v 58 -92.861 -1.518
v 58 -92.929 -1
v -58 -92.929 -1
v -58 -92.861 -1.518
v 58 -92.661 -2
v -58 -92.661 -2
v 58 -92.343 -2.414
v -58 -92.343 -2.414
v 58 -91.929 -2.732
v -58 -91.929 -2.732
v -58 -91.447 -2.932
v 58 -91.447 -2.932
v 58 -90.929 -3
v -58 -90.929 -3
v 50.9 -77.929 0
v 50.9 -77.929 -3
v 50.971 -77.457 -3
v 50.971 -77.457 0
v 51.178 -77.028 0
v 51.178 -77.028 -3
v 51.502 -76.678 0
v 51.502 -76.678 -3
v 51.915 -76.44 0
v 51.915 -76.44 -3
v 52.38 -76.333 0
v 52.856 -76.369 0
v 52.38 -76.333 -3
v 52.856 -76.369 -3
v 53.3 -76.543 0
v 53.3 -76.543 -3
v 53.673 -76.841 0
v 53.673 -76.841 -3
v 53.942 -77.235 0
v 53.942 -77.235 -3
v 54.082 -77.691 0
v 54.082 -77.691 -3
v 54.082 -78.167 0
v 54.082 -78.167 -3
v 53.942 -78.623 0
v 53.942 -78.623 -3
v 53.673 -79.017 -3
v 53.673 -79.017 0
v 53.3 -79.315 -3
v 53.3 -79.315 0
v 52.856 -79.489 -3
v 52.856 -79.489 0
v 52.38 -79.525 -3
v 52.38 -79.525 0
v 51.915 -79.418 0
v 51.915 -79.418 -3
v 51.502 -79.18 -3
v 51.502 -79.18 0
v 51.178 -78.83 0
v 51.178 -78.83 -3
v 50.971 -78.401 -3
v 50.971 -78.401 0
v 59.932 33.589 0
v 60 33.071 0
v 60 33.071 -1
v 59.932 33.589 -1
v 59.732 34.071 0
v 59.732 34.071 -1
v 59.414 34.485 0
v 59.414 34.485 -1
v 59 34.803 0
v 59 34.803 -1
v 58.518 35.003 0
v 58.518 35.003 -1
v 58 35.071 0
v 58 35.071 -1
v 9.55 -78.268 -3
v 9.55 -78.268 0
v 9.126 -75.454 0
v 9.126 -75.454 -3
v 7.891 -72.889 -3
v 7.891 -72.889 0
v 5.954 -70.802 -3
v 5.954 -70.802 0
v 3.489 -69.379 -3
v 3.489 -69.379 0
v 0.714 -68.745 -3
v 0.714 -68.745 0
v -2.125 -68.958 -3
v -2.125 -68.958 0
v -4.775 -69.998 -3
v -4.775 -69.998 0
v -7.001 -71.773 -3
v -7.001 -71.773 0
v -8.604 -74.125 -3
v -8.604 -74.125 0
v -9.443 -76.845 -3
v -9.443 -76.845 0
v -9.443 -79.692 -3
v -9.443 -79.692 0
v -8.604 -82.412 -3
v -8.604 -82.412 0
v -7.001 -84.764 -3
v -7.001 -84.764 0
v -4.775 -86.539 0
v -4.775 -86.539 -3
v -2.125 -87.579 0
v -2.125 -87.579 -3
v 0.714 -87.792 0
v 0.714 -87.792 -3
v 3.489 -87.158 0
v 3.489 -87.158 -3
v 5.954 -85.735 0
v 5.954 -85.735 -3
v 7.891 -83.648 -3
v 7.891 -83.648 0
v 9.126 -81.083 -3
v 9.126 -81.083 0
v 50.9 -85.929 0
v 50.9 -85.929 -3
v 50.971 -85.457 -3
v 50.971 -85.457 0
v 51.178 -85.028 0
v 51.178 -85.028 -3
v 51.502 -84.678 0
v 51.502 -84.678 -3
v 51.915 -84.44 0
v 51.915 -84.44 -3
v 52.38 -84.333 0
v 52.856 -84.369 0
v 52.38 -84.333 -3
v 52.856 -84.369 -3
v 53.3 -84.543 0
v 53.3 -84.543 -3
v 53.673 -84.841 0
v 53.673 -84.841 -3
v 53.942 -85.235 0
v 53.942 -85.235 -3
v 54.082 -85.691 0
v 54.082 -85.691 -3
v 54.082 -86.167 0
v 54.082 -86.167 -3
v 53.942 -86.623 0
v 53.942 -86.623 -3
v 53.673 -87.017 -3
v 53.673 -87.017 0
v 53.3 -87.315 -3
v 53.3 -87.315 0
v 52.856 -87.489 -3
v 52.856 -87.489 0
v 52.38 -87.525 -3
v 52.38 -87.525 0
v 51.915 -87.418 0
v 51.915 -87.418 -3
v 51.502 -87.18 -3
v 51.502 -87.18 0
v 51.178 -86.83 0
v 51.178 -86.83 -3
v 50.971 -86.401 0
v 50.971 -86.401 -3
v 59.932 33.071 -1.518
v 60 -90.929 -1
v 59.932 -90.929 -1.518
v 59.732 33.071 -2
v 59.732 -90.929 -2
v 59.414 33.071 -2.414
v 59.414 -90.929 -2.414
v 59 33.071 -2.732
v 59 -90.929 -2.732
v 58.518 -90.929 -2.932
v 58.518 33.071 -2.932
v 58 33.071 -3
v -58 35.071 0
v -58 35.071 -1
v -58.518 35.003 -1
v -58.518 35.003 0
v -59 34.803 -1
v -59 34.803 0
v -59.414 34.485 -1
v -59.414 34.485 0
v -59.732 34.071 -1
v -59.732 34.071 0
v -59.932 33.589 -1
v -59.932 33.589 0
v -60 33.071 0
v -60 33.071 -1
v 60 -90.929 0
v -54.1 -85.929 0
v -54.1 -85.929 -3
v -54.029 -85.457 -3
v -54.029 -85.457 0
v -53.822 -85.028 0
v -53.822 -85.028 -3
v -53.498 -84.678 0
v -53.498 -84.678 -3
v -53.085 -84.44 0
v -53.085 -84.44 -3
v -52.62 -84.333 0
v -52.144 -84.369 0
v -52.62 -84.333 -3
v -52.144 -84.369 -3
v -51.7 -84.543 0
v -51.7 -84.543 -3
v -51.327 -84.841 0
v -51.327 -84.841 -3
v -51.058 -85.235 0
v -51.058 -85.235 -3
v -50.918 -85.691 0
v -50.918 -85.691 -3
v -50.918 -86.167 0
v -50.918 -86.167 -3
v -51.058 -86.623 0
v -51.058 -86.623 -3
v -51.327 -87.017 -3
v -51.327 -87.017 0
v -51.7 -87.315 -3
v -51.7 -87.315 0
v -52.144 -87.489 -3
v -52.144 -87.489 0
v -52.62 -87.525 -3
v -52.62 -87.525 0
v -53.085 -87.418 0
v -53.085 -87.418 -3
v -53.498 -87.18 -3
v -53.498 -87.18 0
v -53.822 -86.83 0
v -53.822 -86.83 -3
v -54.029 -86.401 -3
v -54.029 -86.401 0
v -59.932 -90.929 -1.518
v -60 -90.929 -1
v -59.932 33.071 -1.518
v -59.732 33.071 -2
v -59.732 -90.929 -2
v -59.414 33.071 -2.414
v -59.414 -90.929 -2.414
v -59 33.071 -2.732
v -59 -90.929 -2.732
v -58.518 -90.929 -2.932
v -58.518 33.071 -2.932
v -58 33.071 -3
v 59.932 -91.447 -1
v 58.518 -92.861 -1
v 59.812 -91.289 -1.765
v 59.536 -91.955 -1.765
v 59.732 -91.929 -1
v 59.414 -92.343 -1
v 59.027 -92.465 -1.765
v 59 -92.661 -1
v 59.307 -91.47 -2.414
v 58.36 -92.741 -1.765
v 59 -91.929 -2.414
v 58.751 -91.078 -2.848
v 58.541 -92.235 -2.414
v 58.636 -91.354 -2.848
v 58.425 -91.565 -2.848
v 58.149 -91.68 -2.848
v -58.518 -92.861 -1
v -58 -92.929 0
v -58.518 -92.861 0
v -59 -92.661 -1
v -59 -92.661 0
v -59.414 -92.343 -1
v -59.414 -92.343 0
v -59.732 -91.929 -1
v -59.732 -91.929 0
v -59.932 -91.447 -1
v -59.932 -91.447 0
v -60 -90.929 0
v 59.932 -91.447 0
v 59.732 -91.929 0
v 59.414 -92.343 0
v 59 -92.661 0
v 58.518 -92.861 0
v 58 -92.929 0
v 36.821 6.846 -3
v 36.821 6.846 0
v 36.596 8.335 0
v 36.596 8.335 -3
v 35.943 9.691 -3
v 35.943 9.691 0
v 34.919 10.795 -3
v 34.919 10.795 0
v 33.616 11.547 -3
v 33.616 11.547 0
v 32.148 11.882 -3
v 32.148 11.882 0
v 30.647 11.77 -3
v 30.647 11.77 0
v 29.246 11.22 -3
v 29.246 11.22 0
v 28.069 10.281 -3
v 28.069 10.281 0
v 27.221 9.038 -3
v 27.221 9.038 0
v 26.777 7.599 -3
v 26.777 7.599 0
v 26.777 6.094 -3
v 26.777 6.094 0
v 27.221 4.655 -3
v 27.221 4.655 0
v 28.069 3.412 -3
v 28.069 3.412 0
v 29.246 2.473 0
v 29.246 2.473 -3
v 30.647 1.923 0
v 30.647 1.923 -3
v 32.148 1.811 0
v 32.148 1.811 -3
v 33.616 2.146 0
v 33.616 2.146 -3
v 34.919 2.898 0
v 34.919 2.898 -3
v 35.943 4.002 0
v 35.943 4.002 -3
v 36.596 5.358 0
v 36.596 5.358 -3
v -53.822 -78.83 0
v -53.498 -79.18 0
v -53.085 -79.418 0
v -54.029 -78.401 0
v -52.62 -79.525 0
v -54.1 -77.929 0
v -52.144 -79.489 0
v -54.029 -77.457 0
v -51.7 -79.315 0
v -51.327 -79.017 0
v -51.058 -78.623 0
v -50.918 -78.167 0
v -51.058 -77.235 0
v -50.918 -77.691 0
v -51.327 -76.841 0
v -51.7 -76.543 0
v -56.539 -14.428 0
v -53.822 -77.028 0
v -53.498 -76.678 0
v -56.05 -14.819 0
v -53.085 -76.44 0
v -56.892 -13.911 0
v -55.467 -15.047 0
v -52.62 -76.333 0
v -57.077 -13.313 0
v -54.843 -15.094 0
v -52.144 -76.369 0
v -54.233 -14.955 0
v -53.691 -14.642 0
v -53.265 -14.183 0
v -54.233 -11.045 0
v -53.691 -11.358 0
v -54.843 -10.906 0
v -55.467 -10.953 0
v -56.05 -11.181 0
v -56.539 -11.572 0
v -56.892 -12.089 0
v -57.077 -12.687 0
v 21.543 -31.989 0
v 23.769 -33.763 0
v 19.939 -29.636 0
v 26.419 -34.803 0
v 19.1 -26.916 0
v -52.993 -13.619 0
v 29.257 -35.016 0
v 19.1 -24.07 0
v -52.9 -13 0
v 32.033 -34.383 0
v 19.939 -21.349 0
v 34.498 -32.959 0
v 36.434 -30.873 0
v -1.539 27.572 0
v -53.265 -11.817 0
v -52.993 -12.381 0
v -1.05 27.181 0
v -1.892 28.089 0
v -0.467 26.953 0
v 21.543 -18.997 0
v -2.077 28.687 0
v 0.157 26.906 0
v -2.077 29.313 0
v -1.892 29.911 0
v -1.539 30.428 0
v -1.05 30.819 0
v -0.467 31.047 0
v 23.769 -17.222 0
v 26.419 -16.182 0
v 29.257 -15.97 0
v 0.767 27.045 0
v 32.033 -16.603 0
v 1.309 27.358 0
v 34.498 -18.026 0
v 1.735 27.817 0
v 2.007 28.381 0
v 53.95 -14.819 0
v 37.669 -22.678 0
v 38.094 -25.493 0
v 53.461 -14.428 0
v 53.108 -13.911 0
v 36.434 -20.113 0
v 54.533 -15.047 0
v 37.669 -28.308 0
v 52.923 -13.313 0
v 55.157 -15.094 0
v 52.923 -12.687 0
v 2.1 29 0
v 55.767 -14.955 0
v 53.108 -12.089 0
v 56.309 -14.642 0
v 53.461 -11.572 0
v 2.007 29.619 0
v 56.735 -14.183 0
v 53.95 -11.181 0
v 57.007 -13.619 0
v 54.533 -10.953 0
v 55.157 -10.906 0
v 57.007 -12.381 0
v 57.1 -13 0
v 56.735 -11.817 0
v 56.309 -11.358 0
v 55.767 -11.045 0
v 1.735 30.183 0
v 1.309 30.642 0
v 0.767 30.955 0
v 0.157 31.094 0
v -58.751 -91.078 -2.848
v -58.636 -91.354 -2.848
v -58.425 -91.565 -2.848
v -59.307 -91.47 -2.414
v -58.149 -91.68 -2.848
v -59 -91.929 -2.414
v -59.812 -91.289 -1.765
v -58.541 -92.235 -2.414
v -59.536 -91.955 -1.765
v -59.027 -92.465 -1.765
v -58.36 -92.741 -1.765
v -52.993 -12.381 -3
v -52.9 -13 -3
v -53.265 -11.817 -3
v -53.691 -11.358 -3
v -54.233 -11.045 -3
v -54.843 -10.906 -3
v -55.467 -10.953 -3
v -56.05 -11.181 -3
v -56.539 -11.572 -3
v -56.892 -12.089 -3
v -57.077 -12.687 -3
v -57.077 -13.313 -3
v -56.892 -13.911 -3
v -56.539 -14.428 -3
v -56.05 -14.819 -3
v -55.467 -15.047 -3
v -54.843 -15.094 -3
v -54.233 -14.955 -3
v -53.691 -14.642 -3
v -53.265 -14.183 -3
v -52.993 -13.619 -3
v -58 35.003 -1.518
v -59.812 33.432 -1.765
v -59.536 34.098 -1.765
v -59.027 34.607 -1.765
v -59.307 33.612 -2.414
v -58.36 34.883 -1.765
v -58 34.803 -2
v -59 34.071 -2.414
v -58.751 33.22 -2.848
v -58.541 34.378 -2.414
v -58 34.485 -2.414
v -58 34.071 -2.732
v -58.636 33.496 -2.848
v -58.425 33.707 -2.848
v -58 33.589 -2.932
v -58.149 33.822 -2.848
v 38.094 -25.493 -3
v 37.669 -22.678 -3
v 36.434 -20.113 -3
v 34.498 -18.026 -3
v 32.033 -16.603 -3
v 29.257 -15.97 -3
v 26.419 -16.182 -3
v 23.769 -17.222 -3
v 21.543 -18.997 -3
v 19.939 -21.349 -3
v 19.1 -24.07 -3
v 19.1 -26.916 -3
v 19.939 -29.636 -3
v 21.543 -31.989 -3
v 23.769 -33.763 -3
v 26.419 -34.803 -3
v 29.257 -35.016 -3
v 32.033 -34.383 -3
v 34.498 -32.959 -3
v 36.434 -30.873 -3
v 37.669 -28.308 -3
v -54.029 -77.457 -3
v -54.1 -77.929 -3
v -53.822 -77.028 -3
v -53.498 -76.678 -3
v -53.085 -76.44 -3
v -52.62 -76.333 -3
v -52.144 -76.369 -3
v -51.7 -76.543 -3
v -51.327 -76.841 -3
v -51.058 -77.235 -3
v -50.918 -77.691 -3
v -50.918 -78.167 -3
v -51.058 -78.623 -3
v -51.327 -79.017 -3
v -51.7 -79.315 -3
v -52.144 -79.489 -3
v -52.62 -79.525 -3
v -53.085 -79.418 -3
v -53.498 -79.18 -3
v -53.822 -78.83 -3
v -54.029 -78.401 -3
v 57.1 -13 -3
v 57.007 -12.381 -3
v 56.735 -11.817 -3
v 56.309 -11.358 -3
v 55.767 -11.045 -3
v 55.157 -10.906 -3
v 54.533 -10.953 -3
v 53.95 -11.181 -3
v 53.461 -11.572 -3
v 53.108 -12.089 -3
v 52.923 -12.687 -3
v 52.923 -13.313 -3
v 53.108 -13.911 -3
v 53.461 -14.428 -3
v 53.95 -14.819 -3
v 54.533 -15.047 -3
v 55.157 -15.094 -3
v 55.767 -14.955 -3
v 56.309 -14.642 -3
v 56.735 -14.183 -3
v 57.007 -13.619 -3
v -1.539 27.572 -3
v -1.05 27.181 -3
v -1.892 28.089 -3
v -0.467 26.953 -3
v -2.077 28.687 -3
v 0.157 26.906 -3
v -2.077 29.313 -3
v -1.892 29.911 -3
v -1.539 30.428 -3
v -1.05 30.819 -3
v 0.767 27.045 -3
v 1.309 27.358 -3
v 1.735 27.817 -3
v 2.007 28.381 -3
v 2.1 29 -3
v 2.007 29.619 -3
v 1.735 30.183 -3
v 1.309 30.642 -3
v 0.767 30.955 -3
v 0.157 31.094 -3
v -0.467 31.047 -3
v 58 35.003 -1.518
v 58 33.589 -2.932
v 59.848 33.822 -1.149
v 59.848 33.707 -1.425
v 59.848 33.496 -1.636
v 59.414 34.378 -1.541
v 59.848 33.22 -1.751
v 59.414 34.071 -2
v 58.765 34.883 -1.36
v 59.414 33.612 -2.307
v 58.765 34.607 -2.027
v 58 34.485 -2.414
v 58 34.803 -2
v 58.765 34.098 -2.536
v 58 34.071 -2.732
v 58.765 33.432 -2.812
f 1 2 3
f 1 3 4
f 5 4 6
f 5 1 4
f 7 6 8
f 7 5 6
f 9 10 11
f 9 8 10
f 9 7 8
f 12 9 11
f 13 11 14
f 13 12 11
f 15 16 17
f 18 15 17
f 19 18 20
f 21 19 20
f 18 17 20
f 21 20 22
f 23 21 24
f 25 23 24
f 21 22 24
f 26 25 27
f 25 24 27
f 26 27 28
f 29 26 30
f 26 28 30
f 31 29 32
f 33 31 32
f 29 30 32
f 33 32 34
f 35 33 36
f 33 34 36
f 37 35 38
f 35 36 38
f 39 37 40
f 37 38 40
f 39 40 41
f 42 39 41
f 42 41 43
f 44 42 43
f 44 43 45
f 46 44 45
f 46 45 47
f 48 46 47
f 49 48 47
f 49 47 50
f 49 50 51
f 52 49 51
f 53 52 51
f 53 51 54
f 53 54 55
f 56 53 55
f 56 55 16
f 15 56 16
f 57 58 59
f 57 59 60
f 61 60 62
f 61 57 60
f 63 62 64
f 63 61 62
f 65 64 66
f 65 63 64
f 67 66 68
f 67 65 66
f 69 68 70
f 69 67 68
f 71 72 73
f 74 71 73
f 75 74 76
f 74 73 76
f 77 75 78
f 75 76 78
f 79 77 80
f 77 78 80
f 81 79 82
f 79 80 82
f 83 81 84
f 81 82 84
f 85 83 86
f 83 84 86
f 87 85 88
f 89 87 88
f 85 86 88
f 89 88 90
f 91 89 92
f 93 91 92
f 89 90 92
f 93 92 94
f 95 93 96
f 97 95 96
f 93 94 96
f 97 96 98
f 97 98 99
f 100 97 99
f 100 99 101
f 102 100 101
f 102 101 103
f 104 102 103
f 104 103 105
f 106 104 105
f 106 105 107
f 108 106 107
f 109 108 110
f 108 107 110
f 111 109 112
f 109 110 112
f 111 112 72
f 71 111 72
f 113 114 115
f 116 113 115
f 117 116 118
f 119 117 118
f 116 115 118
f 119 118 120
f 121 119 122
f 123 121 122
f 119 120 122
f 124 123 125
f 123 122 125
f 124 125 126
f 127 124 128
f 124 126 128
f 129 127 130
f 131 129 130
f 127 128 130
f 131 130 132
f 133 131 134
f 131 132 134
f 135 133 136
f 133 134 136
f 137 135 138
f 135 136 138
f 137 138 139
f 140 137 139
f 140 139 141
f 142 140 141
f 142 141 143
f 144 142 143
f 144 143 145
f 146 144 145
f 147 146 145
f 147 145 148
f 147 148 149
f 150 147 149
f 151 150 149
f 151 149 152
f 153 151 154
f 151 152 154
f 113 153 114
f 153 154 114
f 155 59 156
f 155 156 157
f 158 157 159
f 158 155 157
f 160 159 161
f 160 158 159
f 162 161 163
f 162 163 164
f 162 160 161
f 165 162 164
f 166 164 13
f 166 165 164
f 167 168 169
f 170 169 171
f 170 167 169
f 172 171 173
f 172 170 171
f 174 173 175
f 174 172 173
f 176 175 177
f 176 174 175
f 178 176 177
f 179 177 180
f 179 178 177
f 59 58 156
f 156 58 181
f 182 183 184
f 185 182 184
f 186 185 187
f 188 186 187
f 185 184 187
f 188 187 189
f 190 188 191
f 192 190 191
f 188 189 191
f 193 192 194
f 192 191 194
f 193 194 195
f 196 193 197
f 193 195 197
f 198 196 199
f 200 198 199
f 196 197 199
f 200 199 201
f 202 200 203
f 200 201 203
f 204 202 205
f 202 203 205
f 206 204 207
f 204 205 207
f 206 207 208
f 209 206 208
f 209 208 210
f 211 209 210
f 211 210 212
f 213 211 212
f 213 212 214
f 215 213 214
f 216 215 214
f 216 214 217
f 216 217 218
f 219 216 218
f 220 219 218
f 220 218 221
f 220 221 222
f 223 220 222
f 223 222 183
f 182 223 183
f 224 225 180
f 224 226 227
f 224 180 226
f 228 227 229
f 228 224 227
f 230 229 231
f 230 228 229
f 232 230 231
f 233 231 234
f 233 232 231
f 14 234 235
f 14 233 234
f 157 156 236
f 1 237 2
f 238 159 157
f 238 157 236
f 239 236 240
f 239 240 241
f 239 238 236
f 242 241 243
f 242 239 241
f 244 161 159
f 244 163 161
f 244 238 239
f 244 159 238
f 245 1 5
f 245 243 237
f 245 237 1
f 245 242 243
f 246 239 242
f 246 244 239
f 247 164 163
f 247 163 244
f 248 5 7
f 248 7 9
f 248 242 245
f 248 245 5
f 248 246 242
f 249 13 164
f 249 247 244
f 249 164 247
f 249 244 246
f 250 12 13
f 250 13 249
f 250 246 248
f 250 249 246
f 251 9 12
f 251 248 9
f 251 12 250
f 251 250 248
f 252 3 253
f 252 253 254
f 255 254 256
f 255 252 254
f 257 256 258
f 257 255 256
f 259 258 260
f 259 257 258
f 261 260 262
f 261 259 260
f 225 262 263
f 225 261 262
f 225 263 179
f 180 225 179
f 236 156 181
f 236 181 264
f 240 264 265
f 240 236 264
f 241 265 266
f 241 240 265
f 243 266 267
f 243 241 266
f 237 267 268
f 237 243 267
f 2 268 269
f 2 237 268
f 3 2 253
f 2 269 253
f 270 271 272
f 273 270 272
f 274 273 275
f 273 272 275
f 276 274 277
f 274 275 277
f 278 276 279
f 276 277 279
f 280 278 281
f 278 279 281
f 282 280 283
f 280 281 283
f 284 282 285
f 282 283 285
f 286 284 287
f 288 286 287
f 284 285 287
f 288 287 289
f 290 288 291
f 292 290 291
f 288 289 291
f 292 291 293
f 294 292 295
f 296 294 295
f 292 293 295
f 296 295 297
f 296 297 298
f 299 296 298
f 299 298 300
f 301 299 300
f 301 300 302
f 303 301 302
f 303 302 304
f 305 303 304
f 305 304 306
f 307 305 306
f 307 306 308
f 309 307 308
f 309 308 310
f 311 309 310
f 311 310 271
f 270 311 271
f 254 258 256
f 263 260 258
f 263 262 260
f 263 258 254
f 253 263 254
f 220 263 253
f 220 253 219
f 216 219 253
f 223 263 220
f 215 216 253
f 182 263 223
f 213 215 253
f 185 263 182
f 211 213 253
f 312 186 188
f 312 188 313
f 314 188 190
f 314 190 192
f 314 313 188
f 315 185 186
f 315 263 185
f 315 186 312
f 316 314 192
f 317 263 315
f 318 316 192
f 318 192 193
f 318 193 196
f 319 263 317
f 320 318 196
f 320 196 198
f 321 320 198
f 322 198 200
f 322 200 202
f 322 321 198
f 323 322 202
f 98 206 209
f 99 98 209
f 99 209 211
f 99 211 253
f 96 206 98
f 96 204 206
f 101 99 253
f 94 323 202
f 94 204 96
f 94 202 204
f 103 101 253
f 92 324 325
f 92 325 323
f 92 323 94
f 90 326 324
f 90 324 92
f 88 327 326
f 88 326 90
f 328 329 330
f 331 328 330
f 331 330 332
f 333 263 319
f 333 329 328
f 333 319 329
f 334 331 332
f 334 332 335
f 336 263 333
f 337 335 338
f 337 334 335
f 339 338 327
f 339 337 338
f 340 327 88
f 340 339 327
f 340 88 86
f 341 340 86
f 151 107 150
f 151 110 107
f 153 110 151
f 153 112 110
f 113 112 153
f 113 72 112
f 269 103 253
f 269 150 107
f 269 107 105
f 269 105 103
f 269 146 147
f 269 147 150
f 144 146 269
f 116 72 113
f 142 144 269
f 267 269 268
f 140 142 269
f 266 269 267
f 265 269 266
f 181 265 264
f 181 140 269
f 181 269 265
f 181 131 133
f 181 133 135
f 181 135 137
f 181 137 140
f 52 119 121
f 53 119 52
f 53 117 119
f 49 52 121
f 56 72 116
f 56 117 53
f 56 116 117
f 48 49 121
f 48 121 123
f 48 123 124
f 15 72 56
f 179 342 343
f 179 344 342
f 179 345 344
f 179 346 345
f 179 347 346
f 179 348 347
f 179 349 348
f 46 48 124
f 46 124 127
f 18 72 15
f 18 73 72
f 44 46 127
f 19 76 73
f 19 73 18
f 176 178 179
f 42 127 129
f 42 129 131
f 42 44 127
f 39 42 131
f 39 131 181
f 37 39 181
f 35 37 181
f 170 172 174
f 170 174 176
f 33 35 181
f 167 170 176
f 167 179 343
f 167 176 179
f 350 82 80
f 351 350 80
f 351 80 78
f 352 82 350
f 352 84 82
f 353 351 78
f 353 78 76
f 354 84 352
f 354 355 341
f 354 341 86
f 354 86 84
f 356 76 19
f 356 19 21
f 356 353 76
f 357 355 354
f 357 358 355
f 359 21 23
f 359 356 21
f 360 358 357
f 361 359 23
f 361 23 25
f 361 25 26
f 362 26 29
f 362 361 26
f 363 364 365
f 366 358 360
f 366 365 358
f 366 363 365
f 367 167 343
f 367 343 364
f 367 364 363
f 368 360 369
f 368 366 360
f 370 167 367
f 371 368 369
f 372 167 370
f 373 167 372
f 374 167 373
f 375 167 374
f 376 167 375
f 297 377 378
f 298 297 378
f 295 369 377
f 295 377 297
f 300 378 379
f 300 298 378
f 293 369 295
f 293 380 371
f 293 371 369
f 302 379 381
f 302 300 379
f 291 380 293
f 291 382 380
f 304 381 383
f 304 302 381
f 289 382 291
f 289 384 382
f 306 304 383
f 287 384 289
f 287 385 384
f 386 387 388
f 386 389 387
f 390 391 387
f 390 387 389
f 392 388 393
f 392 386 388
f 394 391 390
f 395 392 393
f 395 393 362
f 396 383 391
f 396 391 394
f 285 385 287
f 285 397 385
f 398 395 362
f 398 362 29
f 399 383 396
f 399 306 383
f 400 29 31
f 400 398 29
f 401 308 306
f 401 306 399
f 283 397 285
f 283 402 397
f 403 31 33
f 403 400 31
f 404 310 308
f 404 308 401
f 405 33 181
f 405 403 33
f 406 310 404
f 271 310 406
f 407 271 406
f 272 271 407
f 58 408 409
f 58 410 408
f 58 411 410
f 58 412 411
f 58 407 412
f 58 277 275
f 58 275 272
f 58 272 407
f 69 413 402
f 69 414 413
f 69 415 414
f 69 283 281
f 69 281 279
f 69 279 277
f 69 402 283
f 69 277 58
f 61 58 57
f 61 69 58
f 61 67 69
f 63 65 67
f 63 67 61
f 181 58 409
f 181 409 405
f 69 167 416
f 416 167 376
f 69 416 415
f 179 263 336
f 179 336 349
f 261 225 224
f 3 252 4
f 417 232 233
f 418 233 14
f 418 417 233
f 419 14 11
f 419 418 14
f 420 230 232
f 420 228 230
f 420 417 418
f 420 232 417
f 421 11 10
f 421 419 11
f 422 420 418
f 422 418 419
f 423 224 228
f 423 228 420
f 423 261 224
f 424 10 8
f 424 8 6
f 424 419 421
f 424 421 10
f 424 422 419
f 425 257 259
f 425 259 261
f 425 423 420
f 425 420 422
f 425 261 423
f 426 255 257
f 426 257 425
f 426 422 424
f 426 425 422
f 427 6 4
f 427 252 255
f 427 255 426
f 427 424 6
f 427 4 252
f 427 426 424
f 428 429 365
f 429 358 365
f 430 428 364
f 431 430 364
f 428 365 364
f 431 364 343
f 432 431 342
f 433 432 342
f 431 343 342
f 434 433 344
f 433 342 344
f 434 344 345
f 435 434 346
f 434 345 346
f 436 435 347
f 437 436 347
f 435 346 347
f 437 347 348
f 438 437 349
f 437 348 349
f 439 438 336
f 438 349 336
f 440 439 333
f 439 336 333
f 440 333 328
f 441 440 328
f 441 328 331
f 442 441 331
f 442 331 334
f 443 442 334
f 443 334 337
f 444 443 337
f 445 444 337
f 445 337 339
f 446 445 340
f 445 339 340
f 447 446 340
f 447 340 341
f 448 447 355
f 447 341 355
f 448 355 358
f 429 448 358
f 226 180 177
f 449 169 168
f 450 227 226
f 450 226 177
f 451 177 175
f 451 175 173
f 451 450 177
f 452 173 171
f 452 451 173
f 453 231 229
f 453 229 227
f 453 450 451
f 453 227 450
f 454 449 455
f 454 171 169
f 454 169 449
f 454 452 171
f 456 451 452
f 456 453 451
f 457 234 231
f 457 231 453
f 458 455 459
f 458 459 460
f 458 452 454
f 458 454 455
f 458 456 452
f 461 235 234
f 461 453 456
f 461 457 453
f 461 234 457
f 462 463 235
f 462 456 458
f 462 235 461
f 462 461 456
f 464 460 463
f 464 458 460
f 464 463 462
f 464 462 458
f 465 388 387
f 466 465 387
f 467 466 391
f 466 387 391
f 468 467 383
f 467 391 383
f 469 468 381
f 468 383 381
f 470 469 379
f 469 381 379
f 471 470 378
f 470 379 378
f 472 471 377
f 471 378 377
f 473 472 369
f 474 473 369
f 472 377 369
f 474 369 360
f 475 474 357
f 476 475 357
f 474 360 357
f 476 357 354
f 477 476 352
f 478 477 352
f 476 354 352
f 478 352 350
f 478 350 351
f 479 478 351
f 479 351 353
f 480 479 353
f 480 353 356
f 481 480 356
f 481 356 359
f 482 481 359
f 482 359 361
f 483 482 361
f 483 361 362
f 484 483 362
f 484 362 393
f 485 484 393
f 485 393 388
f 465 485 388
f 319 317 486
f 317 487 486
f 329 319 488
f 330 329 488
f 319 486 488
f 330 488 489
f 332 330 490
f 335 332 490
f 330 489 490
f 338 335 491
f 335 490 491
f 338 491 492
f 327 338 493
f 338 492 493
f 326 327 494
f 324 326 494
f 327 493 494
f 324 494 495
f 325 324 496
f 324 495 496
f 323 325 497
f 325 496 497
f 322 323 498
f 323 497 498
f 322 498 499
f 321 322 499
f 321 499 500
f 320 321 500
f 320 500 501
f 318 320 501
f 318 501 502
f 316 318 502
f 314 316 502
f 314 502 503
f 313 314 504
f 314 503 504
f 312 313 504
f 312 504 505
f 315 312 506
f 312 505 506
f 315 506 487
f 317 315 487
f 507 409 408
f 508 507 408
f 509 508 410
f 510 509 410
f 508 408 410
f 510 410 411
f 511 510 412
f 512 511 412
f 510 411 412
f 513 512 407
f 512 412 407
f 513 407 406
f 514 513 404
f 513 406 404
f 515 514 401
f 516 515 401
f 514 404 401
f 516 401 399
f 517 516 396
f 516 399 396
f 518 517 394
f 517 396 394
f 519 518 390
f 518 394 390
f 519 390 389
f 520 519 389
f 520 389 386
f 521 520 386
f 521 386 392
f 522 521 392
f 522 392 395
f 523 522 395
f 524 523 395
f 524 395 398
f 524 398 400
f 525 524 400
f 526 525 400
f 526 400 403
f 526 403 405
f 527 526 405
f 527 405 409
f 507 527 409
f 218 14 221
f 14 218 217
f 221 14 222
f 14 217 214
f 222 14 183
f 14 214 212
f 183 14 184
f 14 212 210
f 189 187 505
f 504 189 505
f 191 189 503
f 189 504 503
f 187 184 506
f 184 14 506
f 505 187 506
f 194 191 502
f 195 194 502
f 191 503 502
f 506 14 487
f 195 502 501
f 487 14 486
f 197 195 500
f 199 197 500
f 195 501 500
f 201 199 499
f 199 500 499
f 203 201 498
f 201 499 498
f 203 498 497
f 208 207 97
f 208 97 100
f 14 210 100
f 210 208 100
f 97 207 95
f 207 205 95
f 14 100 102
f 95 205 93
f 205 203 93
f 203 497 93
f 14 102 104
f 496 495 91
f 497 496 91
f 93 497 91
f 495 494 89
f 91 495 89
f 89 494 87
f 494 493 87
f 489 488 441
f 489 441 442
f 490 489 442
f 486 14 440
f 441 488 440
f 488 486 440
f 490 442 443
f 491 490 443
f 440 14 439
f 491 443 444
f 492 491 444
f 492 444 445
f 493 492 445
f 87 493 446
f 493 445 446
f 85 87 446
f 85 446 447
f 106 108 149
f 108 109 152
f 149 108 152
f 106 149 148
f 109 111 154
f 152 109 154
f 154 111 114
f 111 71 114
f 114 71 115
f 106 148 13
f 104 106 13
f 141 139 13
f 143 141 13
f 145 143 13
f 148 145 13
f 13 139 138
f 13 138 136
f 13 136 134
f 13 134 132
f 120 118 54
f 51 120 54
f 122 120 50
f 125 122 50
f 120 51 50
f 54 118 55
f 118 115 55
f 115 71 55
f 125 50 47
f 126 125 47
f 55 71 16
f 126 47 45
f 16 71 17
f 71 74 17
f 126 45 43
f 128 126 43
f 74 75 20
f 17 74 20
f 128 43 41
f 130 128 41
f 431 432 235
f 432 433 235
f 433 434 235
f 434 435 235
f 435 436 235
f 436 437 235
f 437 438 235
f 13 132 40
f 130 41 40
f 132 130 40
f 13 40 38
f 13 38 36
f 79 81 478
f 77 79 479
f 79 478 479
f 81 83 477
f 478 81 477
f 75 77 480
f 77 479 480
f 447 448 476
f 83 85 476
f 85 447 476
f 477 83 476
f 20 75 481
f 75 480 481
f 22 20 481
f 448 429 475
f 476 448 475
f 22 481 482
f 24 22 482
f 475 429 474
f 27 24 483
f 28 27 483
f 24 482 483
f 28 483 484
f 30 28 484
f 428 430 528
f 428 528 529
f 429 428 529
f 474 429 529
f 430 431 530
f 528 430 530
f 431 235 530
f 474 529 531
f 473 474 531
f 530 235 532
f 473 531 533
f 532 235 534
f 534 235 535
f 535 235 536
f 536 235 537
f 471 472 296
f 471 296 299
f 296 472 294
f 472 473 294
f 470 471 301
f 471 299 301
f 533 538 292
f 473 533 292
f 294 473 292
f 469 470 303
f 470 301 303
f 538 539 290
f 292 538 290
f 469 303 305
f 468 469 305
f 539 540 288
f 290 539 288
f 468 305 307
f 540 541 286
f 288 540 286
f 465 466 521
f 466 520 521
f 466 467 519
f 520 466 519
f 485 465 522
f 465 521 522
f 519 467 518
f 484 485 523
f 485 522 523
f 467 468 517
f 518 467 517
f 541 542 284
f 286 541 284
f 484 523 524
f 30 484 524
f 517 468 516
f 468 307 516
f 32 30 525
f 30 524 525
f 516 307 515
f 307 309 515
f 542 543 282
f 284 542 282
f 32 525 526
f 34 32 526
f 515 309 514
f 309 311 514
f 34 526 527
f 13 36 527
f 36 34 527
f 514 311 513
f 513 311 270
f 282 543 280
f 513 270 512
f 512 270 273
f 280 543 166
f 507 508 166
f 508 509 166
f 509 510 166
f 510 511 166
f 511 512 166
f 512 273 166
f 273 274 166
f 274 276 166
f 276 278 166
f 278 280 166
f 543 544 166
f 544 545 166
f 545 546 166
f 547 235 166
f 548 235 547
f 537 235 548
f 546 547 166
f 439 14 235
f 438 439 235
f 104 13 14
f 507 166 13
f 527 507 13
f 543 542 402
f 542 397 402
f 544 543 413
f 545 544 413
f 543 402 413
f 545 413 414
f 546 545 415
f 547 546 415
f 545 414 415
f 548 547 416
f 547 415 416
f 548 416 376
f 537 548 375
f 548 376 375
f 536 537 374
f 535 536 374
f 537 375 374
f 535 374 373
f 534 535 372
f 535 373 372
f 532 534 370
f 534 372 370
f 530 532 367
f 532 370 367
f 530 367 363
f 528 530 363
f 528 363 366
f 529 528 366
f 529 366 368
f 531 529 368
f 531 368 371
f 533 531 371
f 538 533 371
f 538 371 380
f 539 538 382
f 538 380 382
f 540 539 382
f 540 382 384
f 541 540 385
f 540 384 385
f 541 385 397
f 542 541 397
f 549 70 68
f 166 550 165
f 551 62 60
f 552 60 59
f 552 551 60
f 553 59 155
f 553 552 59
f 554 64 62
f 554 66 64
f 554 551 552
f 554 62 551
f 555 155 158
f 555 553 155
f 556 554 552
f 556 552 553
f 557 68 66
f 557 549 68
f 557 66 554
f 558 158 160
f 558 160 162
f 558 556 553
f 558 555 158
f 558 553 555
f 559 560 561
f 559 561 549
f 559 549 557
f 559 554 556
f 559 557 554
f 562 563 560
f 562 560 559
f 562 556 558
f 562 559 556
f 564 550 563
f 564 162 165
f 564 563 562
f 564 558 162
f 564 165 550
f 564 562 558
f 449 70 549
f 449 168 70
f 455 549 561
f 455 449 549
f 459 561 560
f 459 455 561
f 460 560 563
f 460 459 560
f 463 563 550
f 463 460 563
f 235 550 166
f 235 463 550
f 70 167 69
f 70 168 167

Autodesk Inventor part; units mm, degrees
ref_plane "YZ Plane" through (0, 0, 0) normal (1, 0, 0) x (0, 1, 0)
ref_plane "XZ Plane" through (0, 0, 0) normal (0, 1, 0) x (-1, 0, 0)
ref_plane "XY Plane" through (0, 0, 0) normal (0, 0, 1) x (1, 0, 0)
sketch "スケッチ3" plane through (0, 0, 0) normal (0, 0, 1) x (1, 0, 0)
  line L0 (60, -99.3436) -> (-60, -99.3436)
  line L1 (-60, -99.3436) -> (-60, 99.3436)
  line L2 (-60, 99.3436) -> (60, 99.3436)
  line L3 (60, 99.3436) -> (60, -99.3436)
  line L4 (60, -99.3436) -> (-60, 99.3436) construction
  line L5 (-60, -99.3436) -> (60, 99.3436) construction
  point P0 (0, 0)
  dimension "d25" = 120
extrude "押し出し1" add sketch "スケッチ3" against normal blind 3
sketch "スケッチ4" plane through (0, 0, 0) normal (0, 0, 1) x (1, 0, 0)
  line L0 (0, 45.0711) -> (68.3595, 45.0711)
  line L1 (68.3595, 45.0711) -> (-74.3824, 45.0711)
  line L2 (-74.3824, 45.0711) -> (108.1656, 45.0711)
  line L3 (108.1656, 45.0711) -> (108.1656, 129.4154)
  line L4 (108.1656, 129.4154) -> (-74.3824, 129.4154)
  line L5 (-74.3824, 129.4154) -> (-74.3824, 45.0711)
  point P0 (0, 0)
extrude "押し出し4" cut sketch "スケッチ4" against normal blind 10
sketch "スケッチ13" plane through (0, 0, 0) normal (0, 0, 1) x (1, 0, 0)
  circle A0 centre (0, 0) radius 7.5
  circle A1 centre (0, 0) radius 32.5
  circle A2 centre (31.7707, 6.8465) radius 25
  circle A3 centre (31.7707, 6.8465) radius 7.5
  circle A4 centre (31.7707, 6.8465) radius 32.5
  circle A5 centre (28.5436, -25.4929) radius 25
  circle A6 centre (28.5436, -25.4929) radius 20
  circle A7 centre (28.5436, -25.4929) radius 60
  circle A8 centre (0, -78.2685) radius 40
  circle A9 centre (0, -78.2685) radius 50
  circle A10 centre (31.7707, 6.8465) radius 5.05
  circle A11 centre (28.5436, -25.4929) radius 9.55
  circle A12 centre (0, -78.2685) radius 9.55
  dimension "d87" = 65
  dimension "d89" = 65
  dimension "d91" = 120
  dimension "d86" = 15
  dimension "d88" = 15
  dimension "d90" = 40
  dimension "d92" = 100
  dimension "d96" = 10.1
  dimension "d97" = 19.1
  dimension "d98" = 19.1
extrude "押し出し16" cut sketch "スケッチ13" against normal blind 10 contours A10 A1 | A1 A10 | A11 A1 A2 | A2 A1 A4 A11 | A4 A1 A11 | A2 A11 A4 A1 | A1 A11 A2 | A4 A11 A1 | A12 A7 | A7 A12
sketch "スケッチ14" plane through (0, 0, 0) normal (0, 0, 1) x (1, 0, 0)
  point P0 (0, 0)
sketch "スケッチ15" plane through (0, 0, 0) normal (0, 0, 1) x (1, 0, 0)
  line L0 (-60, -99.3436) -> (-60, 45.0711) projected
  line L1 (60, 45.0711) -> (60, -99.3436) projected
  line L2 (-60, 45.0711) -> (60, 45.0711)
  line L3 (60, 45.0711) -> (60, -92.9289)
  line L4 (60, -92.9289) -> (-60, -92.9289)
  line L5 (-60, -92.9289) -> (-60, 45.0711)
  point P0 (0, 0)
  dimension "d101" = 138
extrude "押し出し17" cut sketch "スケッチ15" against normal blind 10 keep common part
sketch "スケッチ16" plane through (-60, 45.0711, 0) normal (0, 1, 0) x (1, 0, 0)
  line L0 (-11.4218, 21.1899) -> (145.405, 21.1899)
  line L1 (145.405, 21.1899) -> (145.405, -40.3361)
  line L2 (145.405, -40.3361) -> (-11.4218, -40.3361)
  line L3 (-11.4218, -40.3361) -> (-11.4218, 21.1899)
  point P0 (60, 0)
extrude "押し出し18" cut sketch "スケッチ16" against normal blind 10
sketch "スケッチ17" plane through (0, 0, 0) normal (0, 0, 1) x (1, 0, 0)
  circle A0 centre (31.7707, 6.8465) radius 5
  circle A1 centre (31.7707, 6.8465) radius 25
  circle A2 centre (28.5436, -25.4929) radius 9.5
  circle A3 centre (28.5436, -25.4929) radius 25
  circle A4 centre (55, -13) radius 2.1
  circle A5 centre (-55, -13) radius 2.1
  circle A6 centre (0, 29) radius 2.1
  point P0 (0, 0)
  point P1 (0, 0)
  dimension "d106" = 50
  dimension "d107" = 50
  dimension "d108" = 4.2
  dimension "d109" = 4.2
  dimension "d110" = 4.2
extrude "押し出し19" cut sketch "スケッチ17" against normal blind 10 contours A4 | A5 | A6
sketch "スケッチ18" plane through (0, 0, -3) normal (0, 0, -1) x (-1, 0, 0)
  circle A0 centre (52.5, -85.929) radius 1.6
  circle A1 centre (52.5, -77.929) radius 1.6
  circle A2 centre (-52.5, -77.929) radius 1.6
  circle A3 centre (-52.5, -85.929) radius 1.6
  point P0 (0, 0)
  dimension "d113" = 3.2
  dimension "d114" = 3.2
  dimension "d115" = 3.2
  dimension "d116" = 3.2
extrude "押し出し20" cut sketch "スケッチ18" against normal blind 10
fillet "フィレット2" radius 2 4 edges at (0, 35.0711, -3) (-60, 35.0711, -1.5) (-60, -92.9289, -1.5) (60, -92.9289, -1.5)
fillet "フィレット3" radius 2 8 edges at (60, 34.4853, -2.4142) (60, -28.9289, -3) (59.4142, -92.3431, -3) (0, -92.9289, -3) (-59.4142, -92.3431, -3) (-60, -28.9289, -3) (-59.4142, 34.4853, -2.4142) (60, 35.0711, -0.5)
properties part number "板2" material "アルミニウム 6061"
